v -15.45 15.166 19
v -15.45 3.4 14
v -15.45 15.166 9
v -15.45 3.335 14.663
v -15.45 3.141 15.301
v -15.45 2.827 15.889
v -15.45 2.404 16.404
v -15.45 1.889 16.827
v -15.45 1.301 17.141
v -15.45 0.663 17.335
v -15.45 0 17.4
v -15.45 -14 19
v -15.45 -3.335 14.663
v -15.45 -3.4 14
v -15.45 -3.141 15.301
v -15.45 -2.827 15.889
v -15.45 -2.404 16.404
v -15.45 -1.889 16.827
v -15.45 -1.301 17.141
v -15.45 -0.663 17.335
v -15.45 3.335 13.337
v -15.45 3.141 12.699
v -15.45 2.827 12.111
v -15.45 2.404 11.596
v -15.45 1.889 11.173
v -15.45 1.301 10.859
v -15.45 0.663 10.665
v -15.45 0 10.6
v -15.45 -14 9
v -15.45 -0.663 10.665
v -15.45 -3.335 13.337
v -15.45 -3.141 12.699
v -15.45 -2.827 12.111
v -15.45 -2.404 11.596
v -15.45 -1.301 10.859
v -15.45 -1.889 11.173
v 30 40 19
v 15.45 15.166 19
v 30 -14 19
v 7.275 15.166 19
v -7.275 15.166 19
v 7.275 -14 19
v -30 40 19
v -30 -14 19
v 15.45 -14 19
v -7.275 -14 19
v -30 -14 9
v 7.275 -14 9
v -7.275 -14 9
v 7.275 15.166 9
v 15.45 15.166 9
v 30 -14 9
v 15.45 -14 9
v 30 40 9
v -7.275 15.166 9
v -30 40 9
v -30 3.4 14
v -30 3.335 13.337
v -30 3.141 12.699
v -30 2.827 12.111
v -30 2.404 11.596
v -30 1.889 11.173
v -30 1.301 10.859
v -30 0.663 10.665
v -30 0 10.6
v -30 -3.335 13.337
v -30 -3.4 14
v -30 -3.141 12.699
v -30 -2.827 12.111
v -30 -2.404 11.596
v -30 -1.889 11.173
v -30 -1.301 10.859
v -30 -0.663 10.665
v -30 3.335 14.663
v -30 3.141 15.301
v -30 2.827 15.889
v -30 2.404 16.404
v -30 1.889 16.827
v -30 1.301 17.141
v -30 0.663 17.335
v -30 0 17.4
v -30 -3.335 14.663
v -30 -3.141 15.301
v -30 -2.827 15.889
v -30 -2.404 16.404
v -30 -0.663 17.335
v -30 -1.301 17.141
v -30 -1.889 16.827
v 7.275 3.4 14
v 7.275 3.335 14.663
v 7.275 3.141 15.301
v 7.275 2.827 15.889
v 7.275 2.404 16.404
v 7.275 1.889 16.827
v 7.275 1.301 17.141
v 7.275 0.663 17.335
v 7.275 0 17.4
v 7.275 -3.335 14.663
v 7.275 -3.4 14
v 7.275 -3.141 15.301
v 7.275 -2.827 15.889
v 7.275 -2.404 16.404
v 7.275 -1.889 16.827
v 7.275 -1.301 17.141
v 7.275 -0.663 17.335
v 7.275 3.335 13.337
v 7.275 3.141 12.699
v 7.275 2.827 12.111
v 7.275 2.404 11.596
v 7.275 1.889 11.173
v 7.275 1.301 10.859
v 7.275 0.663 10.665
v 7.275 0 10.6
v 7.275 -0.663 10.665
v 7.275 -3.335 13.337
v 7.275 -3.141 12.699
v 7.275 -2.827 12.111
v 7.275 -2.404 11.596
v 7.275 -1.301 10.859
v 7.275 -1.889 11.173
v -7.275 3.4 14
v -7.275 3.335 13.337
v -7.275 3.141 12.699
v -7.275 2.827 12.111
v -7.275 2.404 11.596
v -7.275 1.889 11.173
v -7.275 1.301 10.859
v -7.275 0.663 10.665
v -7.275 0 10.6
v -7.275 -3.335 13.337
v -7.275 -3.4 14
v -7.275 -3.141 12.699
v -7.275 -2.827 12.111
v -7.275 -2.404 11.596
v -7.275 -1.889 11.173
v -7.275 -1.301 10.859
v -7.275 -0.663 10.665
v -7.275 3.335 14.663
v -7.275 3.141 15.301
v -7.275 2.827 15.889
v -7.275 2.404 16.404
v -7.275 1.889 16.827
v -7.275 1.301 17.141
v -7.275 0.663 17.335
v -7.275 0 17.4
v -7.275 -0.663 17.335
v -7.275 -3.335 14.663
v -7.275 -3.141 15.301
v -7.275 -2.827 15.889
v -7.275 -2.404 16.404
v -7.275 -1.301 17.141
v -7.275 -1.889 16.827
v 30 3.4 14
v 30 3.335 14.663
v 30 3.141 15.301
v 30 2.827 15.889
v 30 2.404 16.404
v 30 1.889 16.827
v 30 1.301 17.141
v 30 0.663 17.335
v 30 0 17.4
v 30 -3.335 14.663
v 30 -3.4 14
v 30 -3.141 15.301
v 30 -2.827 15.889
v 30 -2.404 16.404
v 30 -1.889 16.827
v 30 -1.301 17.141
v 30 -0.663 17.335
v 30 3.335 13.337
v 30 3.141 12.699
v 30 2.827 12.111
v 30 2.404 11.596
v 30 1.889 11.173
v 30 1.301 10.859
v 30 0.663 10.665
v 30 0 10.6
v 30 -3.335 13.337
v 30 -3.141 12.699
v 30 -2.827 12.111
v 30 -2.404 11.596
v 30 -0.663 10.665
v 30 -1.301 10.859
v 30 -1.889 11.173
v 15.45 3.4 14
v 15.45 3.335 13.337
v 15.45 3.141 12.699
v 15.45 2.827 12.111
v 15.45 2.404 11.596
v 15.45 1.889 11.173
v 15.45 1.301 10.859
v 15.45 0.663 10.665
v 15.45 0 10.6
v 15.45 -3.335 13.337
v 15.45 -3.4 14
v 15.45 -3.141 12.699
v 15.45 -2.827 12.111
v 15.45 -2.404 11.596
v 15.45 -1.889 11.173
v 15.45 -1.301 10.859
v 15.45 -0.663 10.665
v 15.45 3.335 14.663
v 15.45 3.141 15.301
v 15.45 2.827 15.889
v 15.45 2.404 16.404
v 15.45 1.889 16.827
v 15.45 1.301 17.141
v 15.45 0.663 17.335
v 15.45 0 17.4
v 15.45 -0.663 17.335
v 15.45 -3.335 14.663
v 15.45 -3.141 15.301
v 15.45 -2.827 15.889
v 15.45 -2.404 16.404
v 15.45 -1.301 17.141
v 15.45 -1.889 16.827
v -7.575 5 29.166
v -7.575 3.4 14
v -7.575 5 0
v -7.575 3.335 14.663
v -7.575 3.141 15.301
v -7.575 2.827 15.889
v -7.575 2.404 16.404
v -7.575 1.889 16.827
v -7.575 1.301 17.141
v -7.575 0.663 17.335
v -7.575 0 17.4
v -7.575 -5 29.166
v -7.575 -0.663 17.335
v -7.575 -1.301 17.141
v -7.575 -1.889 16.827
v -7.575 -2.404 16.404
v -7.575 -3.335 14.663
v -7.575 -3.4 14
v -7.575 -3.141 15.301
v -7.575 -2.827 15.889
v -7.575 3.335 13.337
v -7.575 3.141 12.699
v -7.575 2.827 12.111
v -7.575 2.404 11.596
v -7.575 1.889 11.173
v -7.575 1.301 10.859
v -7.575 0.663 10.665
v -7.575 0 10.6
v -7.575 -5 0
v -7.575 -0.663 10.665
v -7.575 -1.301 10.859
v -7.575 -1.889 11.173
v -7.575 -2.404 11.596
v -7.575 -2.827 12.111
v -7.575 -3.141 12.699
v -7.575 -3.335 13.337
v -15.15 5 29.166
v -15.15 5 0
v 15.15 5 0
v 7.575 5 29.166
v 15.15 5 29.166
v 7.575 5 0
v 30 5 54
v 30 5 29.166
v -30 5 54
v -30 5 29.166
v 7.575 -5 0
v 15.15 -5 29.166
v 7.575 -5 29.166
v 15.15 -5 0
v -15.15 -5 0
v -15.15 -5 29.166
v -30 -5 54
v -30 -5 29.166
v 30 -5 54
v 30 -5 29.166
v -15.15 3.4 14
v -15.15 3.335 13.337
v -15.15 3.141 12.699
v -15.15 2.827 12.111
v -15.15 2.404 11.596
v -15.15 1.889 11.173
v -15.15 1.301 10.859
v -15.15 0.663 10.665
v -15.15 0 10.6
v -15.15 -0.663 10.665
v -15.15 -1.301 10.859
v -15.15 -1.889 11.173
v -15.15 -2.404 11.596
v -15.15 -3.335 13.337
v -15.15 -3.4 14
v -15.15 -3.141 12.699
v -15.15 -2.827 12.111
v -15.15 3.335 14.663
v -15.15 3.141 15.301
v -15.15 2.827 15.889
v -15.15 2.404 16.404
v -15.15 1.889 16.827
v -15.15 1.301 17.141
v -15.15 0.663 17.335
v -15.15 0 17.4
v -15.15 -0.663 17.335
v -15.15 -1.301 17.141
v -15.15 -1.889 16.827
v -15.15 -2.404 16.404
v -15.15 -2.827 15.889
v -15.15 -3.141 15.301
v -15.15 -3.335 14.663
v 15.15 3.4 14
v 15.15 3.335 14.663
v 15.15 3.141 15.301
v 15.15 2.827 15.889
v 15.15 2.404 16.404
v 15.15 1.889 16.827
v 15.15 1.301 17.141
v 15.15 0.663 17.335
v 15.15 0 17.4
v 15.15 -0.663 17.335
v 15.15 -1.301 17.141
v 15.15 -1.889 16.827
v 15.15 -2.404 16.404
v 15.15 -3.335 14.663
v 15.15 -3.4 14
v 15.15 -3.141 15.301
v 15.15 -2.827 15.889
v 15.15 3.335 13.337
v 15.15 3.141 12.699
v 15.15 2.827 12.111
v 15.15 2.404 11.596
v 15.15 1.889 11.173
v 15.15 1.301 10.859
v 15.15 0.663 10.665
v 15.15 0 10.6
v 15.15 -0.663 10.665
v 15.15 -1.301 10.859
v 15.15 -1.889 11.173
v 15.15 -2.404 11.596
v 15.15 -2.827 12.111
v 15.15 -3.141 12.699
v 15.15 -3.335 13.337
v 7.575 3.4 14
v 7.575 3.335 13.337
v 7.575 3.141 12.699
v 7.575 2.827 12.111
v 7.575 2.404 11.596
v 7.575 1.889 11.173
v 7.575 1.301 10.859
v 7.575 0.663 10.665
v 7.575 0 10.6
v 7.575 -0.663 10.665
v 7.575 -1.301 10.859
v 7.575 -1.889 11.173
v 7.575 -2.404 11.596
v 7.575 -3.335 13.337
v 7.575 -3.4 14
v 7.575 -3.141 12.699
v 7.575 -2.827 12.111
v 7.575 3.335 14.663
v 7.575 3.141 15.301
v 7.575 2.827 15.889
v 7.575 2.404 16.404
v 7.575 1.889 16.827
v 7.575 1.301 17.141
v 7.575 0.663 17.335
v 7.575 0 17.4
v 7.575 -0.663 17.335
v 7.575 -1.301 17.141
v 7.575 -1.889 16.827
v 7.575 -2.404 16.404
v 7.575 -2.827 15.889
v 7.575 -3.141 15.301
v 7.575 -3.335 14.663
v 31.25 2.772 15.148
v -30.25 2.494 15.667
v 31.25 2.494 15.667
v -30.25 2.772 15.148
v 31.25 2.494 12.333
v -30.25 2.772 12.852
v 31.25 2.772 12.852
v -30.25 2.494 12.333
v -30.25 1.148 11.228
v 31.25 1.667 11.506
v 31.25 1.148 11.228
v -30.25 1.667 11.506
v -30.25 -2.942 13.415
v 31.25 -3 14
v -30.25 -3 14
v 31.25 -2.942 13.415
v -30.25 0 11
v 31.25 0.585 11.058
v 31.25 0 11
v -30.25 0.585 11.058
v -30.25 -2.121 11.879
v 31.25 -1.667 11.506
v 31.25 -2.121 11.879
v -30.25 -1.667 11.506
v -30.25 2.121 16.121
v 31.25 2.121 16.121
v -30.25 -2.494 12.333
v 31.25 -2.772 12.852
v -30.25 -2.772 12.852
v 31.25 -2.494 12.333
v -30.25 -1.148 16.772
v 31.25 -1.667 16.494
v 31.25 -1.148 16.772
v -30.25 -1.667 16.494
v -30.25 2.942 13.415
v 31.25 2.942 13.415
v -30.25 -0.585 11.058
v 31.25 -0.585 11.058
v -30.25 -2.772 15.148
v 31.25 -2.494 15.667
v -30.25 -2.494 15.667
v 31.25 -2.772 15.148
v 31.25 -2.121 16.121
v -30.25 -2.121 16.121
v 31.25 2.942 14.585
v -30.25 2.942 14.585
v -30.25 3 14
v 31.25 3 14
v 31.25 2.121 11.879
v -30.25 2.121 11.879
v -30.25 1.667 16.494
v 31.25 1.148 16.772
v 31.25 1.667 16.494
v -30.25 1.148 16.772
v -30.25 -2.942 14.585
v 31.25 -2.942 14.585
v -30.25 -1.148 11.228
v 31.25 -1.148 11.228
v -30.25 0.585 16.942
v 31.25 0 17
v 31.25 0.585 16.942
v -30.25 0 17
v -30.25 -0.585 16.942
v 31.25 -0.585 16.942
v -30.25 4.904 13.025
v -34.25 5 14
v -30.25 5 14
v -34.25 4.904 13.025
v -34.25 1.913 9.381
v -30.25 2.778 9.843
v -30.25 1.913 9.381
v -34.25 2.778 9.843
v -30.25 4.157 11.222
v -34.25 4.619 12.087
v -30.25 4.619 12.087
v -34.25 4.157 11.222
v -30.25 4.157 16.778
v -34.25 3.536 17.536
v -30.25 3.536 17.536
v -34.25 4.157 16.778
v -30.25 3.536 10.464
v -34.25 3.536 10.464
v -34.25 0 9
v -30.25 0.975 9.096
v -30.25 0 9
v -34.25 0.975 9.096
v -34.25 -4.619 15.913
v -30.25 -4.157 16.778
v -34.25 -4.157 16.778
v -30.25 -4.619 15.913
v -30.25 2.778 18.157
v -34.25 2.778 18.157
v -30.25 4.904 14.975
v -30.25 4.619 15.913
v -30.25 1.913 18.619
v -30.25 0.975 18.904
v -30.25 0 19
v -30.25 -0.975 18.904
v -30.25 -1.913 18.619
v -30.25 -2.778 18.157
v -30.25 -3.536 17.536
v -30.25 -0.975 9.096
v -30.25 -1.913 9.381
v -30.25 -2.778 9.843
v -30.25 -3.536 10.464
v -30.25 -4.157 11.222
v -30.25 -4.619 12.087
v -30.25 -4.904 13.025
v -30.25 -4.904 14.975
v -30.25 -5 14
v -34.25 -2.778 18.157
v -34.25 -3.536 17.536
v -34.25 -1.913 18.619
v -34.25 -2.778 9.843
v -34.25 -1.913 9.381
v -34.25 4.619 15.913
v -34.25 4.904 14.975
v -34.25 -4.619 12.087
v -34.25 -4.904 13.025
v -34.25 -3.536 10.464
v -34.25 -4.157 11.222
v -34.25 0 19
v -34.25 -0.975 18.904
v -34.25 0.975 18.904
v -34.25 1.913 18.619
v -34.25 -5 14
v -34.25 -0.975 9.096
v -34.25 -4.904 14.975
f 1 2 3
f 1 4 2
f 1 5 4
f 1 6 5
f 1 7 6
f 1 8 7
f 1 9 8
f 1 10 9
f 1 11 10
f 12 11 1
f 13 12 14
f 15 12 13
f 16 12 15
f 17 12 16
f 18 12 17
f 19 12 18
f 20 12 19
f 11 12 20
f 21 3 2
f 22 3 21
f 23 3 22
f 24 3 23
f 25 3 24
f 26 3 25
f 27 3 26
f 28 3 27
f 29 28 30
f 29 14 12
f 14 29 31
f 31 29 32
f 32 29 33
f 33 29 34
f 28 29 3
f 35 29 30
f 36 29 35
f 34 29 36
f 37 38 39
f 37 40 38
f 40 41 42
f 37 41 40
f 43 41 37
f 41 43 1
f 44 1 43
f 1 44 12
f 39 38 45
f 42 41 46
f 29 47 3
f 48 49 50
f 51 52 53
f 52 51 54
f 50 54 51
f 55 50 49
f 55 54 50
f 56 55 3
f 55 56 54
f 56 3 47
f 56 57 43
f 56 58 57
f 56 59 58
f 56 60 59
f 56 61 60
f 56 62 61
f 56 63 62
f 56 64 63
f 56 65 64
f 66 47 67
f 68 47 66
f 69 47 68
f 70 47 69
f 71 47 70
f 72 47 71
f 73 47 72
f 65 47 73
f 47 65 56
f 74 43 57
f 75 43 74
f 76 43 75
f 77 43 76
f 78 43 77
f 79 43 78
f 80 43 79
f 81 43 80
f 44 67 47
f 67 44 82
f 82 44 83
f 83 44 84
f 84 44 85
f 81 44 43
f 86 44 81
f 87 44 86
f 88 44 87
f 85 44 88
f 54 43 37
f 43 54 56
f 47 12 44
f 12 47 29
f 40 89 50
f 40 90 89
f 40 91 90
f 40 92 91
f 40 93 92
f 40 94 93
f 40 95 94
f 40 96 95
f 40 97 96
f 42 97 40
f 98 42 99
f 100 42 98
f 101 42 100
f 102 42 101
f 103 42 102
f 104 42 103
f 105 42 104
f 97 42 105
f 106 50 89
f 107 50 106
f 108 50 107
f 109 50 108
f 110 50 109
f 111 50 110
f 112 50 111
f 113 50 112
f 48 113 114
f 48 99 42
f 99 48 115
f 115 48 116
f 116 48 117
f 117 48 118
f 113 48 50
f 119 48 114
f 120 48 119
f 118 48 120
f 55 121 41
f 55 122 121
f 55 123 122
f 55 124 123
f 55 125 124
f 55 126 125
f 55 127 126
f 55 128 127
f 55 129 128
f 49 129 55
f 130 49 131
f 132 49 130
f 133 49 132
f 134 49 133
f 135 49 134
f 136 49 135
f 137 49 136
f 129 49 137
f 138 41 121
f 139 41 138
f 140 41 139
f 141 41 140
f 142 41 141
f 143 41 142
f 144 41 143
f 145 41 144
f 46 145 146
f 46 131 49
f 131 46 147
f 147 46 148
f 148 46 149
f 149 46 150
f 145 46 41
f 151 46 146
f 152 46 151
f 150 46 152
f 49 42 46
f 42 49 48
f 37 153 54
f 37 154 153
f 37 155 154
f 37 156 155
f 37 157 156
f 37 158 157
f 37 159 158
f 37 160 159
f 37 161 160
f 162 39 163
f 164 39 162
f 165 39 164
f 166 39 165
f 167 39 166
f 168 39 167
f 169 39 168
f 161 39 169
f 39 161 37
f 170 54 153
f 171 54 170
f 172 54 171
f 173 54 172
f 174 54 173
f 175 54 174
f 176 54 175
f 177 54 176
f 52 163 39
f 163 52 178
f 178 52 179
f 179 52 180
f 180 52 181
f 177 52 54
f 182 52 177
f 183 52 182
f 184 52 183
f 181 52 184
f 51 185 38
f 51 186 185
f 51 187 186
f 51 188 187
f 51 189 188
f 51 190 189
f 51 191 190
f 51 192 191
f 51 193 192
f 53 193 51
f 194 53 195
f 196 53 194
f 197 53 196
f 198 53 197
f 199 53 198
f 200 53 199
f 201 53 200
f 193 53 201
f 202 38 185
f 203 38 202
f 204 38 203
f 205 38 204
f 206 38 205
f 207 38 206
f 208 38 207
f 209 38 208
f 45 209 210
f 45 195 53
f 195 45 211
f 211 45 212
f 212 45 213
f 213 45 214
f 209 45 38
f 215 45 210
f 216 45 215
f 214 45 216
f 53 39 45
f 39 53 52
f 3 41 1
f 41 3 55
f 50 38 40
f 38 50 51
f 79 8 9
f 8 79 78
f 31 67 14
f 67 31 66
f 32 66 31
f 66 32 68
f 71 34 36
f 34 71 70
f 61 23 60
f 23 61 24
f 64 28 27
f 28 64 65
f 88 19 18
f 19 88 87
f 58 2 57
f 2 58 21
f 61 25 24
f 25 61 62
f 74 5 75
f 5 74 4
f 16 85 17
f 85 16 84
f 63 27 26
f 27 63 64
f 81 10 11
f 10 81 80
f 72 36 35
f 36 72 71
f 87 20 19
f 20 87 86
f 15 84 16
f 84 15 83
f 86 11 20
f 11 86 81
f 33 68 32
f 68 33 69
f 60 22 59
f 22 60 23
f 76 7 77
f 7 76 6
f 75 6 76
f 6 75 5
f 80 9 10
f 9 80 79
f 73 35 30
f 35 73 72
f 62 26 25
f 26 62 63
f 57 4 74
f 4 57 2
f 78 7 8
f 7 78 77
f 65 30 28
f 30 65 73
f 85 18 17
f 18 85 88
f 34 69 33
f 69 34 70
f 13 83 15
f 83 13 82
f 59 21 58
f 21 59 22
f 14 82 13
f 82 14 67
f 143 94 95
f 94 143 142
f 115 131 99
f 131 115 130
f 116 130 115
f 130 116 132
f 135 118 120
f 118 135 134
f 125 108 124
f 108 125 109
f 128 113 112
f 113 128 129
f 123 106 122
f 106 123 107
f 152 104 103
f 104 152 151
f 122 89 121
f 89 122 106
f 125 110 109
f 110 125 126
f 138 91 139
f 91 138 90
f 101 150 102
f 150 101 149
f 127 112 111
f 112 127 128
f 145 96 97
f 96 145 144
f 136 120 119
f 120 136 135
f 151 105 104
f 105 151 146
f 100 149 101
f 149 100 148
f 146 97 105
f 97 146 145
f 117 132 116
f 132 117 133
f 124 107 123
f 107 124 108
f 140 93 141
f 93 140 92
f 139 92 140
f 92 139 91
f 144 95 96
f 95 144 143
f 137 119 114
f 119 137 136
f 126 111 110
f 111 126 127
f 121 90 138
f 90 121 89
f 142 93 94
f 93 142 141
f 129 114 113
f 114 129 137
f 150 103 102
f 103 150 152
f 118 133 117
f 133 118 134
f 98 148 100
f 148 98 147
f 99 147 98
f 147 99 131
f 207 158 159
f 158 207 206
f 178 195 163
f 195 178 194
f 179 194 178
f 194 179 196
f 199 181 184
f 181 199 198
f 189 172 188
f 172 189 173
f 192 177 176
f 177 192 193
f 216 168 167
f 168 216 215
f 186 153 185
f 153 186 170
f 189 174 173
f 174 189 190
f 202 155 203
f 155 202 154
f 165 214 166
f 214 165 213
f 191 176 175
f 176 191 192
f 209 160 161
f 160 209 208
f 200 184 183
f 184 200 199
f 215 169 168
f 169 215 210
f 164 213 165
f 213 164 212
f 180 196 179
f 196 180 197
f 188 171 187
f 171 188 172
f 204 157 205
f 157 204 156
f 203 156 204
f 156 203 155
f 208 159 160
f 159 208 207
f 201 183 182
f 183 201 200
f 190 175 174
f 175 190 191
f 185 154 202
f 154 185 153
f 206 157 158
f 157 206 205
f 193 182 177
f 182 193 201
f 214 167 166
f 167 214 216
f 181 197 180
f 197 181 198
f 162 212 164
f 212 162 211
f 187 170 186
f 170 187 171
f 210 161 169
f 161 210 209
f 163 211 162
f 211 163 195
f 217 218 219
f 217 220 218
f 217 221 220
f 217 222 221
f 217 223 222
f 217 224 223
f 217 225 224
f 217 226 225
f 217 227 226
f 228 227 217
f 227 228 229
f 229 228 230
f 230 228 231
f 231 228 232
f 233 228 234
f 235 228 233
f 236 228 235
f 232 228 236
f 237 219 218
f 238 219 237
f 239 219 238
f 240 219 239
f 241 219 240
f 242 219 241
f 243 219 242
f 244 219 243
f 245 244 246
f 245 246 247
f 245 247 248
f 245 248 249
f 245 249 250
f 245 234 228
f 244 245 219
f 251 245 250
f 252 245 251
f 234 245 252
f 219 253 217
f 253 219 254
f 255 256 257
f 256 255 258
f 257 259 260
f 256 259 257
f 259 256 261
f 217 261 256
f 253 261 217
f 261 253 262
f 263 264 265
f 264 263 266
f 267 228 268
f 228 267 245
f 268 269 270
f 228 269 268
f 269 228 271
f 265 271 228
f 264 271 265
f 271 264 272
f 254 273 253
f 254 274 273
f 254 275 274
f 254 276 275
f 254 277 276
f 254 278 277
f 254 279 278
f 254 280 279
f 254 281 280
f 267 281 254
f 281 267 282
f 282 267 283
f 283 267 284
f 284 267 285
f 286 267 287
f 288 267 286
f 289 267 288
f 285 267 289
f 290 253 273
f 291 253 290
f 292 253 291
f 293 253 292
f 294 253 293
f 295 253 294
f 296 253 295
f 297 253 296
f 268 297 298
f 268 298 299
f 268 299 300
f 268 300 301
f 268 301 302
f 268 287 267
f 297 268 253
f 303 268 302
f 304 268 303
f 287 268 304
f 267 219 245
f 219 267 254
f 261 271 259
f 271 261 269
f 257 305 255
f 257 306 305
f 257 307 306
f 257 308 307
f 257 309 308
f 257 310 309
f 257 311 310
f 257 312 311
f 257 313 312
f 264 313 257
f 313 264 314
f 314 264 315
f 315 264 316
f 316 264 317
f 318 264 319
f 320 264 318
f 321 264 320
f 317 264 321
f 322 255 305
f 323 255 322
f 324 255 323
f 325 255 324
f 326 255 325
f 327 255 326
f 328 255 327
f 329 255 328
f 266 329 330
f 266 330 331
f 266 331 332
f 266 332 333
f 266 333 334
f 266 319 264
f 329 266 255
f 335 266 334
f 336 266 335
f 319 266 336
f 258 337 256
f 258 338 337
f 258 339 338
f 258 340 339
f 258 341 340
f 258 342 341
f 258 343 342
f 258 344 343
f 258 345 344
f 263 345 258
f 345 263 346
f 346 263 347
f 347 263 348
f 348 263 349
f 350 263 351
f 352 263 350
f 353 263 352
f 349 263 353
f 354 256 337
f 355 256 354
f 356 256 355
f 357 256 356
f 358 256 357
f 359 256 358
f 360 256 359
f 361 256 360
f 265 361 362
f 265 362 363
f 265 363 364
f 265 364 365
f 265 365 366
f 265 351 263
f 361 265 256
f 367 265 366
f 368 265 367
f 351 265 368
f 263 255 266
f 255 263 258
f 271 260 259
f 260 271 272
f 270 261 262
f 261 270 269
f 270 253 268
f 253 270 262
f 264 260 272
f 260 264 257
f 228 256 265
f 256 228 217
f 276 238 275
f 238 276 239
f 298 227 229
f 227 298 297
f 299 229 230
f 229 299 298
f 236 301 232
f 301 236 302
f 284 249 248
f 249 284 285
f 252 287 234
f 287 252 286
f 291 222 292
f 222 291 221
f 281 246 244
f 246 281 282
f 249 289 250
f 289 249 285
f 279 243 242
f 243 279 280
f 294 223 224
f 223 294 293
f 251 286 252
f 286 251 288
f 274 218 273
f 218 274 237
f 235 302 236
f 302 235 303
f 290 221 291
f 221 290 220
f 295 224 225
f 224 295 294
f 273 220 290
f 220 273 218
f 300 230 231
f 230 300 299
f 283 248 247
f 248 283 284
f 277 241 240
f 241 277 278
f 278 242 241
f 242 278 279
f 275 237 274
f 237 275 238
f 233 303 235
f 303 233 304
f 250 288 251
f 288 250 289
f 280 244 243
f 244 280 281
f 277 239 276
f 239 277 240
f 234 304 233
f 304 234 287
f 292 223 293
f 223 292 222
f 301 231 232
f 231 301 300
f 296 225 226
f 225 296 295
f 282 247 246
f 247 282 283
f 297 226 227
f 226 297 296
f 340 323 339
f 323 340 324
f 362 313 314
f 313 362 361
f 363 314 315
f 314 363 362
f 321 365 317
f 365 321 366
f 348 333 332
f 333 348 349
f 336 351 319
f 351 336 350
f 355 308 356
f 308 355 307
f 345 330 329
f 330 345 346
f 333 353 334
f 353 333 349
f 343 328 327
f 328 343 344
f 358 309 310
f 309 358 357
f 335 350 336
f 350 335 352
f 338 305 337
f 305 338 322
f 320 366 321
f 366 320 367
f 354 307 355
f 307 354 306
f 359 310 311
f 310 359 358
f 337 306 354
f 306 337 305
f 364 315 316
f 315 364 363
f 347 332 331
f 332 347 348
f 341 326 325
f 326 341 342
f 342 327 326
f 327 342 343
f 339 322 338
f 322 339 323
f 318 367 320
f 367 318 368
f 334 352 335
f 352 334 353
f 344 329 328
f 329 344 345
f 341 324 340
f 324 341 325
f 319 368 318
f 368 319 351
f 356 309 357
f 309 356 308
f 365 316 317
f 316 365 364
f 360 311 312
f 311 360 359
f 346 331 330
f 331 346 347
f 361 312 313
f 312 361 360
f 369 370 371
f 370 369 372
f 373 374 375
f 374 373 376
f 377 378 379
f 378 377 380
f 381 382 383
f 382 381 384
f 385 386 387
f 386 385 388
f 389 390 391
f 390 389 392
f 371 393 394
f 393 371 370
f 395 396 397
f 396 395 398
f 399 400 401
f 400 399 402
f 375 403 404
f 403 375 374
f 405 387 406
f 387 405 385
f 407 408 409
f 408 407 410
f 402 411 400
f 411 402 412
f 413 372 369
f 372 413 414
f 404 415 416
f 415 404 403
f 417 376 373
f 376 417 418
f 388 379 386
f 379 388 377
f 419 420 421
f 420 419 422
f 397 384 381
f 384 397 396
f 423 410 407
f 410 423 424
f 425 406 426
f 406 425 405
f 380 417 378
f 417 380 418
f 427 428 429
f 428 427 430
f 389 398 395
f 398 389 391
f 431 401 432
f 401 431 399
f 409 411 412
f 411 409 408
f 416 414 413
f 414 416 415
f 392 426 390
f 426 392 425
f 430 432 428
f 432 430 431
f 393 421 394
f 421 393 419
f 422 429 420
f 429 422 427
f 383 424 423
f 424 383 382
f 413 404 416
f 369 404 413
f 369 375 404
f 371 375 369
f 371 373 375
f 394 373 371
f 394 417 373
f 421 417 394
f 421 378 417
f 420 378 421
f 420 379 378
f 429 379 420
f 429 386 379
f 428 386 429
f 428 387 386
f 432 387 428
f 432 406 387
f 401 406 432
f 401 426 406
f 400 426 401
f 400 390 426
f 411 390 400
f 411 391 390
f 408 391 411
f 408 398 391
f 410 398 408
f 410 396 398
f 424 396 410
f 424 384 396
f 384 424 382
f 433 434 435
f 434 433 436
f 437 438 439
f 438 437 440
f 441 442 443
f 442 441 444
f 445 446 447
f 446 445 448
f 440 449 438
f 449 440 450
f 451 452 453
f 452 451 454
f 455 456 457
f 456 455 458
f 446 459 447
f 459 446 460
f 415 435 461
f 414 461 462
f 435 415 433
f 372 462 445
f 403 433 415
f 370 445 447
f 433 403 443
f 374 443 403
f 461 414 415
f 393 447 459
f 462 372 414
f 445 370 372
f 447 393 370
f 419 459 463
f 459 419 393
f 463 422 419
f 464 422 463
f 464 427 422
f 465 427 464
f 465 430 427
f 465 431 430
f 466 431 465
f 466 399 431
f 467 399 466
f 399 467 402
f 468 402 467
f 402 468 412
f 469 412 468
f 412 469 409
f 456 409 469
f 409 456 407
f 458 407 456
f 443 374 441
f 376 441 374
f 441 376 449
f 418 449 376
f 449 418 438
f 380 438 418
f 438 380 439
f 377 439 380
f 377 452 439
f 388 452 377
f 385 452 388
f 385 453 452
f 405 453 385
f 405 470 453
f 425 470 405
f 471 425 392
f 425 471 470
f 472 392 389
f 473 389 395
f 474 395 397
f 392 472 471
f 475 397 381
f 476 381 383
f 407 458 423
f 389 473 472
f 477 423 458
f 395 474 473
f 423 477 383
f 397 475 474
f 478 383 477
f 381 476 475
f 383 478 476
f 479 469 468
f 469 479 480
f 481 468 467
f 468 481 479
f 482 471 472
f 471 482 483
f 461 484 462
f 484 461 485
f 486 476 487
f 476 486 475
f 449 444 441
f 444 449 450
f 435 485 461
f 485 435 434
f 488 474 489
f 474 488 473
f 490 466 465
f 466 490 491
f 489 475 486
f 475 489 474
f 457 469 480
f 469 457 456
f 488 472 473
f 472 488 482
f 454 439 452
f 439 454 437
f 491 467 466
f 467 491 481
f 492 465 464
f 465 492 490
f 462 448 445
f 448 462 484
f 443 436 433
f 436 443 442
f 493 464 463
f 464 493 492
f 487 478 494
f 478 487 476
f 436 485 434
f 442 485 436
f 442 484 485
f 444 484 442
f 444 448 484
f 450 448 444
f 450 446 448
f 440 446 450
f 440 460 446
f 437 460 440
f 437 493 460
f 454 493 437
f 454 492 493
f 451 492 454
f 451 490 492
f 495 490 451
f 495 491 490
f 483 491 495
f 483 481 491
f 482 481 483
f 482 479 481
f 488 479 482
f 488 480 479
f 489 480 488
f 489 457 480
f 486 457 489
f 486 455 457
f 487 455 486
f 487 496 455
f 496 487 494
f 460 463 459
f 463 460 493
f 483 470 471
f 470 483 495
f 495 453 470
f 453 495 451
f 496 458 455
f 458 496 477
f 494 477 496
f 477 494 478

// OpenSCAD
$fn = 32;

// ------------------------------------------------------------------------
// Butt hinge: hinge 60 mm, leaf swung 270 deg
// Every part is its own module, assembly() places every instance.
// ------------------------------------------------------------------------

// --- part 1 ---
module hinge_base() {
  difference() {
    union() {
      translate([-30, -14, -5]) cube([14.55, 54, 10]);
      translate([-7.275, -14, -5]) cube([14.55, 54, 10]);
      translate([15.45, -14, -5]) cube([14.55, 54, 10]);
      translate([-30, 15.166, -5]) cube([60, 24.834, 10]);
    }
    translate([-22.725, 0, 0]) rotate([0, 90, 0]) cylinder(h = 16.55, d = 6.8, center = true);
    translate([0, 0, 0]) rotate([0, 90, 0]) cylinder(h = 16.55, d = 6.8, center = true);
    translate([22.725, 0, 0]) rotate([0, 90, 0]) cylinder(h = 16.55, d = 6.8, center = true);
  }
}

// --- part 2 ---
module hinge_mover() {
  difference() {
    union() {
      translate([-15.15, -40, -5]) cube([7.575, 54, 10]);
      translate([7.575, -40, -5]) cube([7.575, 54, 10]);
      translate([-30, -40, -5]) cube([60, 24.834, 10]);
    }
    translate([-11.362, 0, 0]) rotate([0, 90, 0]) cylinder(h = 9.575, d = 6.8, center = true);
    translate([11.362, 0, 0]) rotate([0, 90, 0]) cylinder(h = 9.575, d = 6.8, center = true);
  }
}

// --- part 3 ---
module hinge_pin() {
  rotate([0, 90, 0]) cylinder(h = 62.5, d = 6, center = true);
  translate([-34.25, 0, 0]) rotate([0, 90, 0]) cylinder(h = 4, d = 10);
}

// --- assembly ---
module assembly() {
  color([0.80, 0.24, 0.20]) translate([0, 0, 14]) rotate([0, 0, 0]) hinge_base();
  color([0.20, 0.45, 0.75]) translate([0, 0, 14]) rotate([270, 0, 0]) hinge_mover();
  color([0.25, 0.62, 0.32]) translate([0, 0, 14]) rotate([0, 0, 0]) hinge_pin();
}

assembly();
